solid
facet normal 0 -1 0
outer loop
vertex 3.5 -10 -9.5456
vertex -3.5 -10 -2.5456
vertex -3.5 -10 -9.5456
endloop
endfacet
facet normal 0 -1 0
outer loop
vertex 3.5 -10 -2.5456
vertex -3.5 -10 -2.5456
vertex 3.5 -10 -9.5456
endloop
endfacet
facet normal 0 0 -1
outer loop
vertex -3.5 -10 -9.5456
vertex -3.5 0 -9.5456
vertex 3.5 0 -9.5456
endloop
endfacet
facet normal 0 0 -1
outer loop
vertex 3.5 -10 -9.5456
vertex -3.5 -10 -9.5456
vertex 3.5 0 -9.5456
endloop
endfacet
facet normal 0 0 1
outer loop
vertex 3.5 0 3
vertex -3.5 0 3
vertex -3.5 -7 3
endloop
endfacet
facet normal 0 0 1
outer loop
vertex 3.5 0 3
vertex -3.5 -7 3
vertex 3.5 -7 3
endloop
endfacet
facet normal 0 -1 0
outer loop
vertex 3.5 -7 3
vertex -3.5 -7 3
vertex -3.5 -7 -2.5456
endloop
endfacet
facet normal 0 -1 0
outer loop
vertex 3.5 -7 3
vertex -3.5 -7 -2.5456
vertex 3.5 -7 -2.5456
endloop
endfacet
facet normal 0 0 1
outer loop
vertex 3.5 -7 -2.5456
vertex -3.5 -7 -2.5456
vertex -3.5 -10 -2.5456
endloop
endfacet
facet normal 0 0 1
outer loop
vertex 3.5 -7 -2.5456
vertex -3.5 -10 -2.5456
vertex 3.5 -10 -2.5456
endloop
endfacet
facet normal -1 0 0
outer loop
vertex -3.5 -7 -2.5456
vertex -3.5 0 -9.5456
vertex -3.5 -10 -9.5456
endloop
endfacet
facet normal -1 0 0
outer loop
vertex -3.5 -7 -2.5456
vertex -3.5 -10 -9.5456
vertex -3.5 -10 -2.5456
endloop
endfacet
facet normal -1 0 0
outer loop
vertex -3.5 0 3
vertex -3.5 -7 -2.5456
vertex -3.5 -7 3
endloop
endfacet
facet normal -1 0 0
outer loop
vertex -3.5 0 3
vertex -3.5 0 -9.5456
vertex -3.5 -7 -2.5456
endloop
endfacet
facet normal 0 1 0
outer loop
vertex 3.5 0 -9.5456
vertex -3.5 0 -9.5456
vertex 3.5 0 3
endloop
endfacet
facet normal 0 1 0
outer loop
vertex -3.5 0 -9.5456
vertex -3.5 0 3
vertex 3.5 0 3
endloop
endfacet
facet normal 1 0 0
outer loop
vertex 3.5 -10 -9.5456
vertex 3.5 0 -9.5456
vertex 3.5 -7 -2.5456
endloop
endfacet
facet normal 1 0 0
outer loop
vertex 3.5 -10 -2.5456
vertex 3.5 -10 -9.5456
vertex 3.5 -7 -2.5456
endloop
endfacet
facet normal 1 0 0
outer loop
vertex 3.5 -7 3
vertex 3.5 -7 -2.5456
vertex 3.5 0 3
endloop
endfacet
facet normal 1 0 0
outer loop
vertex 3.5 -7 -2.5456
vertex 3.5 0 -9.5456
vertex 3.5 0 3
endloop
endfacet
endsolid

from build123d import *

# Parameters (mm, degrees)
F0_W     = 7
F0_H     = 6
F2_DEPTH = 7
F1_W     = 7
F1_H     = 7
F3_DEPTH = 10


with BuildPart() as f2:
    # F0 (on Front) → F2 (new body)
    with BuildSketch(Plane.XZ):
        Rectangle(F0_W, F0_H)
    extrude(amount=F2_DEPTH)

    # F1 (on Front) → F3 (join)
    with BuildSketch(Plane.XZ):
        with Locations((0, -6.045629)):
            Rectangle(F1_W, F1_H)
    extrude(amount=F3_DEPTH)


solid = f2.part
